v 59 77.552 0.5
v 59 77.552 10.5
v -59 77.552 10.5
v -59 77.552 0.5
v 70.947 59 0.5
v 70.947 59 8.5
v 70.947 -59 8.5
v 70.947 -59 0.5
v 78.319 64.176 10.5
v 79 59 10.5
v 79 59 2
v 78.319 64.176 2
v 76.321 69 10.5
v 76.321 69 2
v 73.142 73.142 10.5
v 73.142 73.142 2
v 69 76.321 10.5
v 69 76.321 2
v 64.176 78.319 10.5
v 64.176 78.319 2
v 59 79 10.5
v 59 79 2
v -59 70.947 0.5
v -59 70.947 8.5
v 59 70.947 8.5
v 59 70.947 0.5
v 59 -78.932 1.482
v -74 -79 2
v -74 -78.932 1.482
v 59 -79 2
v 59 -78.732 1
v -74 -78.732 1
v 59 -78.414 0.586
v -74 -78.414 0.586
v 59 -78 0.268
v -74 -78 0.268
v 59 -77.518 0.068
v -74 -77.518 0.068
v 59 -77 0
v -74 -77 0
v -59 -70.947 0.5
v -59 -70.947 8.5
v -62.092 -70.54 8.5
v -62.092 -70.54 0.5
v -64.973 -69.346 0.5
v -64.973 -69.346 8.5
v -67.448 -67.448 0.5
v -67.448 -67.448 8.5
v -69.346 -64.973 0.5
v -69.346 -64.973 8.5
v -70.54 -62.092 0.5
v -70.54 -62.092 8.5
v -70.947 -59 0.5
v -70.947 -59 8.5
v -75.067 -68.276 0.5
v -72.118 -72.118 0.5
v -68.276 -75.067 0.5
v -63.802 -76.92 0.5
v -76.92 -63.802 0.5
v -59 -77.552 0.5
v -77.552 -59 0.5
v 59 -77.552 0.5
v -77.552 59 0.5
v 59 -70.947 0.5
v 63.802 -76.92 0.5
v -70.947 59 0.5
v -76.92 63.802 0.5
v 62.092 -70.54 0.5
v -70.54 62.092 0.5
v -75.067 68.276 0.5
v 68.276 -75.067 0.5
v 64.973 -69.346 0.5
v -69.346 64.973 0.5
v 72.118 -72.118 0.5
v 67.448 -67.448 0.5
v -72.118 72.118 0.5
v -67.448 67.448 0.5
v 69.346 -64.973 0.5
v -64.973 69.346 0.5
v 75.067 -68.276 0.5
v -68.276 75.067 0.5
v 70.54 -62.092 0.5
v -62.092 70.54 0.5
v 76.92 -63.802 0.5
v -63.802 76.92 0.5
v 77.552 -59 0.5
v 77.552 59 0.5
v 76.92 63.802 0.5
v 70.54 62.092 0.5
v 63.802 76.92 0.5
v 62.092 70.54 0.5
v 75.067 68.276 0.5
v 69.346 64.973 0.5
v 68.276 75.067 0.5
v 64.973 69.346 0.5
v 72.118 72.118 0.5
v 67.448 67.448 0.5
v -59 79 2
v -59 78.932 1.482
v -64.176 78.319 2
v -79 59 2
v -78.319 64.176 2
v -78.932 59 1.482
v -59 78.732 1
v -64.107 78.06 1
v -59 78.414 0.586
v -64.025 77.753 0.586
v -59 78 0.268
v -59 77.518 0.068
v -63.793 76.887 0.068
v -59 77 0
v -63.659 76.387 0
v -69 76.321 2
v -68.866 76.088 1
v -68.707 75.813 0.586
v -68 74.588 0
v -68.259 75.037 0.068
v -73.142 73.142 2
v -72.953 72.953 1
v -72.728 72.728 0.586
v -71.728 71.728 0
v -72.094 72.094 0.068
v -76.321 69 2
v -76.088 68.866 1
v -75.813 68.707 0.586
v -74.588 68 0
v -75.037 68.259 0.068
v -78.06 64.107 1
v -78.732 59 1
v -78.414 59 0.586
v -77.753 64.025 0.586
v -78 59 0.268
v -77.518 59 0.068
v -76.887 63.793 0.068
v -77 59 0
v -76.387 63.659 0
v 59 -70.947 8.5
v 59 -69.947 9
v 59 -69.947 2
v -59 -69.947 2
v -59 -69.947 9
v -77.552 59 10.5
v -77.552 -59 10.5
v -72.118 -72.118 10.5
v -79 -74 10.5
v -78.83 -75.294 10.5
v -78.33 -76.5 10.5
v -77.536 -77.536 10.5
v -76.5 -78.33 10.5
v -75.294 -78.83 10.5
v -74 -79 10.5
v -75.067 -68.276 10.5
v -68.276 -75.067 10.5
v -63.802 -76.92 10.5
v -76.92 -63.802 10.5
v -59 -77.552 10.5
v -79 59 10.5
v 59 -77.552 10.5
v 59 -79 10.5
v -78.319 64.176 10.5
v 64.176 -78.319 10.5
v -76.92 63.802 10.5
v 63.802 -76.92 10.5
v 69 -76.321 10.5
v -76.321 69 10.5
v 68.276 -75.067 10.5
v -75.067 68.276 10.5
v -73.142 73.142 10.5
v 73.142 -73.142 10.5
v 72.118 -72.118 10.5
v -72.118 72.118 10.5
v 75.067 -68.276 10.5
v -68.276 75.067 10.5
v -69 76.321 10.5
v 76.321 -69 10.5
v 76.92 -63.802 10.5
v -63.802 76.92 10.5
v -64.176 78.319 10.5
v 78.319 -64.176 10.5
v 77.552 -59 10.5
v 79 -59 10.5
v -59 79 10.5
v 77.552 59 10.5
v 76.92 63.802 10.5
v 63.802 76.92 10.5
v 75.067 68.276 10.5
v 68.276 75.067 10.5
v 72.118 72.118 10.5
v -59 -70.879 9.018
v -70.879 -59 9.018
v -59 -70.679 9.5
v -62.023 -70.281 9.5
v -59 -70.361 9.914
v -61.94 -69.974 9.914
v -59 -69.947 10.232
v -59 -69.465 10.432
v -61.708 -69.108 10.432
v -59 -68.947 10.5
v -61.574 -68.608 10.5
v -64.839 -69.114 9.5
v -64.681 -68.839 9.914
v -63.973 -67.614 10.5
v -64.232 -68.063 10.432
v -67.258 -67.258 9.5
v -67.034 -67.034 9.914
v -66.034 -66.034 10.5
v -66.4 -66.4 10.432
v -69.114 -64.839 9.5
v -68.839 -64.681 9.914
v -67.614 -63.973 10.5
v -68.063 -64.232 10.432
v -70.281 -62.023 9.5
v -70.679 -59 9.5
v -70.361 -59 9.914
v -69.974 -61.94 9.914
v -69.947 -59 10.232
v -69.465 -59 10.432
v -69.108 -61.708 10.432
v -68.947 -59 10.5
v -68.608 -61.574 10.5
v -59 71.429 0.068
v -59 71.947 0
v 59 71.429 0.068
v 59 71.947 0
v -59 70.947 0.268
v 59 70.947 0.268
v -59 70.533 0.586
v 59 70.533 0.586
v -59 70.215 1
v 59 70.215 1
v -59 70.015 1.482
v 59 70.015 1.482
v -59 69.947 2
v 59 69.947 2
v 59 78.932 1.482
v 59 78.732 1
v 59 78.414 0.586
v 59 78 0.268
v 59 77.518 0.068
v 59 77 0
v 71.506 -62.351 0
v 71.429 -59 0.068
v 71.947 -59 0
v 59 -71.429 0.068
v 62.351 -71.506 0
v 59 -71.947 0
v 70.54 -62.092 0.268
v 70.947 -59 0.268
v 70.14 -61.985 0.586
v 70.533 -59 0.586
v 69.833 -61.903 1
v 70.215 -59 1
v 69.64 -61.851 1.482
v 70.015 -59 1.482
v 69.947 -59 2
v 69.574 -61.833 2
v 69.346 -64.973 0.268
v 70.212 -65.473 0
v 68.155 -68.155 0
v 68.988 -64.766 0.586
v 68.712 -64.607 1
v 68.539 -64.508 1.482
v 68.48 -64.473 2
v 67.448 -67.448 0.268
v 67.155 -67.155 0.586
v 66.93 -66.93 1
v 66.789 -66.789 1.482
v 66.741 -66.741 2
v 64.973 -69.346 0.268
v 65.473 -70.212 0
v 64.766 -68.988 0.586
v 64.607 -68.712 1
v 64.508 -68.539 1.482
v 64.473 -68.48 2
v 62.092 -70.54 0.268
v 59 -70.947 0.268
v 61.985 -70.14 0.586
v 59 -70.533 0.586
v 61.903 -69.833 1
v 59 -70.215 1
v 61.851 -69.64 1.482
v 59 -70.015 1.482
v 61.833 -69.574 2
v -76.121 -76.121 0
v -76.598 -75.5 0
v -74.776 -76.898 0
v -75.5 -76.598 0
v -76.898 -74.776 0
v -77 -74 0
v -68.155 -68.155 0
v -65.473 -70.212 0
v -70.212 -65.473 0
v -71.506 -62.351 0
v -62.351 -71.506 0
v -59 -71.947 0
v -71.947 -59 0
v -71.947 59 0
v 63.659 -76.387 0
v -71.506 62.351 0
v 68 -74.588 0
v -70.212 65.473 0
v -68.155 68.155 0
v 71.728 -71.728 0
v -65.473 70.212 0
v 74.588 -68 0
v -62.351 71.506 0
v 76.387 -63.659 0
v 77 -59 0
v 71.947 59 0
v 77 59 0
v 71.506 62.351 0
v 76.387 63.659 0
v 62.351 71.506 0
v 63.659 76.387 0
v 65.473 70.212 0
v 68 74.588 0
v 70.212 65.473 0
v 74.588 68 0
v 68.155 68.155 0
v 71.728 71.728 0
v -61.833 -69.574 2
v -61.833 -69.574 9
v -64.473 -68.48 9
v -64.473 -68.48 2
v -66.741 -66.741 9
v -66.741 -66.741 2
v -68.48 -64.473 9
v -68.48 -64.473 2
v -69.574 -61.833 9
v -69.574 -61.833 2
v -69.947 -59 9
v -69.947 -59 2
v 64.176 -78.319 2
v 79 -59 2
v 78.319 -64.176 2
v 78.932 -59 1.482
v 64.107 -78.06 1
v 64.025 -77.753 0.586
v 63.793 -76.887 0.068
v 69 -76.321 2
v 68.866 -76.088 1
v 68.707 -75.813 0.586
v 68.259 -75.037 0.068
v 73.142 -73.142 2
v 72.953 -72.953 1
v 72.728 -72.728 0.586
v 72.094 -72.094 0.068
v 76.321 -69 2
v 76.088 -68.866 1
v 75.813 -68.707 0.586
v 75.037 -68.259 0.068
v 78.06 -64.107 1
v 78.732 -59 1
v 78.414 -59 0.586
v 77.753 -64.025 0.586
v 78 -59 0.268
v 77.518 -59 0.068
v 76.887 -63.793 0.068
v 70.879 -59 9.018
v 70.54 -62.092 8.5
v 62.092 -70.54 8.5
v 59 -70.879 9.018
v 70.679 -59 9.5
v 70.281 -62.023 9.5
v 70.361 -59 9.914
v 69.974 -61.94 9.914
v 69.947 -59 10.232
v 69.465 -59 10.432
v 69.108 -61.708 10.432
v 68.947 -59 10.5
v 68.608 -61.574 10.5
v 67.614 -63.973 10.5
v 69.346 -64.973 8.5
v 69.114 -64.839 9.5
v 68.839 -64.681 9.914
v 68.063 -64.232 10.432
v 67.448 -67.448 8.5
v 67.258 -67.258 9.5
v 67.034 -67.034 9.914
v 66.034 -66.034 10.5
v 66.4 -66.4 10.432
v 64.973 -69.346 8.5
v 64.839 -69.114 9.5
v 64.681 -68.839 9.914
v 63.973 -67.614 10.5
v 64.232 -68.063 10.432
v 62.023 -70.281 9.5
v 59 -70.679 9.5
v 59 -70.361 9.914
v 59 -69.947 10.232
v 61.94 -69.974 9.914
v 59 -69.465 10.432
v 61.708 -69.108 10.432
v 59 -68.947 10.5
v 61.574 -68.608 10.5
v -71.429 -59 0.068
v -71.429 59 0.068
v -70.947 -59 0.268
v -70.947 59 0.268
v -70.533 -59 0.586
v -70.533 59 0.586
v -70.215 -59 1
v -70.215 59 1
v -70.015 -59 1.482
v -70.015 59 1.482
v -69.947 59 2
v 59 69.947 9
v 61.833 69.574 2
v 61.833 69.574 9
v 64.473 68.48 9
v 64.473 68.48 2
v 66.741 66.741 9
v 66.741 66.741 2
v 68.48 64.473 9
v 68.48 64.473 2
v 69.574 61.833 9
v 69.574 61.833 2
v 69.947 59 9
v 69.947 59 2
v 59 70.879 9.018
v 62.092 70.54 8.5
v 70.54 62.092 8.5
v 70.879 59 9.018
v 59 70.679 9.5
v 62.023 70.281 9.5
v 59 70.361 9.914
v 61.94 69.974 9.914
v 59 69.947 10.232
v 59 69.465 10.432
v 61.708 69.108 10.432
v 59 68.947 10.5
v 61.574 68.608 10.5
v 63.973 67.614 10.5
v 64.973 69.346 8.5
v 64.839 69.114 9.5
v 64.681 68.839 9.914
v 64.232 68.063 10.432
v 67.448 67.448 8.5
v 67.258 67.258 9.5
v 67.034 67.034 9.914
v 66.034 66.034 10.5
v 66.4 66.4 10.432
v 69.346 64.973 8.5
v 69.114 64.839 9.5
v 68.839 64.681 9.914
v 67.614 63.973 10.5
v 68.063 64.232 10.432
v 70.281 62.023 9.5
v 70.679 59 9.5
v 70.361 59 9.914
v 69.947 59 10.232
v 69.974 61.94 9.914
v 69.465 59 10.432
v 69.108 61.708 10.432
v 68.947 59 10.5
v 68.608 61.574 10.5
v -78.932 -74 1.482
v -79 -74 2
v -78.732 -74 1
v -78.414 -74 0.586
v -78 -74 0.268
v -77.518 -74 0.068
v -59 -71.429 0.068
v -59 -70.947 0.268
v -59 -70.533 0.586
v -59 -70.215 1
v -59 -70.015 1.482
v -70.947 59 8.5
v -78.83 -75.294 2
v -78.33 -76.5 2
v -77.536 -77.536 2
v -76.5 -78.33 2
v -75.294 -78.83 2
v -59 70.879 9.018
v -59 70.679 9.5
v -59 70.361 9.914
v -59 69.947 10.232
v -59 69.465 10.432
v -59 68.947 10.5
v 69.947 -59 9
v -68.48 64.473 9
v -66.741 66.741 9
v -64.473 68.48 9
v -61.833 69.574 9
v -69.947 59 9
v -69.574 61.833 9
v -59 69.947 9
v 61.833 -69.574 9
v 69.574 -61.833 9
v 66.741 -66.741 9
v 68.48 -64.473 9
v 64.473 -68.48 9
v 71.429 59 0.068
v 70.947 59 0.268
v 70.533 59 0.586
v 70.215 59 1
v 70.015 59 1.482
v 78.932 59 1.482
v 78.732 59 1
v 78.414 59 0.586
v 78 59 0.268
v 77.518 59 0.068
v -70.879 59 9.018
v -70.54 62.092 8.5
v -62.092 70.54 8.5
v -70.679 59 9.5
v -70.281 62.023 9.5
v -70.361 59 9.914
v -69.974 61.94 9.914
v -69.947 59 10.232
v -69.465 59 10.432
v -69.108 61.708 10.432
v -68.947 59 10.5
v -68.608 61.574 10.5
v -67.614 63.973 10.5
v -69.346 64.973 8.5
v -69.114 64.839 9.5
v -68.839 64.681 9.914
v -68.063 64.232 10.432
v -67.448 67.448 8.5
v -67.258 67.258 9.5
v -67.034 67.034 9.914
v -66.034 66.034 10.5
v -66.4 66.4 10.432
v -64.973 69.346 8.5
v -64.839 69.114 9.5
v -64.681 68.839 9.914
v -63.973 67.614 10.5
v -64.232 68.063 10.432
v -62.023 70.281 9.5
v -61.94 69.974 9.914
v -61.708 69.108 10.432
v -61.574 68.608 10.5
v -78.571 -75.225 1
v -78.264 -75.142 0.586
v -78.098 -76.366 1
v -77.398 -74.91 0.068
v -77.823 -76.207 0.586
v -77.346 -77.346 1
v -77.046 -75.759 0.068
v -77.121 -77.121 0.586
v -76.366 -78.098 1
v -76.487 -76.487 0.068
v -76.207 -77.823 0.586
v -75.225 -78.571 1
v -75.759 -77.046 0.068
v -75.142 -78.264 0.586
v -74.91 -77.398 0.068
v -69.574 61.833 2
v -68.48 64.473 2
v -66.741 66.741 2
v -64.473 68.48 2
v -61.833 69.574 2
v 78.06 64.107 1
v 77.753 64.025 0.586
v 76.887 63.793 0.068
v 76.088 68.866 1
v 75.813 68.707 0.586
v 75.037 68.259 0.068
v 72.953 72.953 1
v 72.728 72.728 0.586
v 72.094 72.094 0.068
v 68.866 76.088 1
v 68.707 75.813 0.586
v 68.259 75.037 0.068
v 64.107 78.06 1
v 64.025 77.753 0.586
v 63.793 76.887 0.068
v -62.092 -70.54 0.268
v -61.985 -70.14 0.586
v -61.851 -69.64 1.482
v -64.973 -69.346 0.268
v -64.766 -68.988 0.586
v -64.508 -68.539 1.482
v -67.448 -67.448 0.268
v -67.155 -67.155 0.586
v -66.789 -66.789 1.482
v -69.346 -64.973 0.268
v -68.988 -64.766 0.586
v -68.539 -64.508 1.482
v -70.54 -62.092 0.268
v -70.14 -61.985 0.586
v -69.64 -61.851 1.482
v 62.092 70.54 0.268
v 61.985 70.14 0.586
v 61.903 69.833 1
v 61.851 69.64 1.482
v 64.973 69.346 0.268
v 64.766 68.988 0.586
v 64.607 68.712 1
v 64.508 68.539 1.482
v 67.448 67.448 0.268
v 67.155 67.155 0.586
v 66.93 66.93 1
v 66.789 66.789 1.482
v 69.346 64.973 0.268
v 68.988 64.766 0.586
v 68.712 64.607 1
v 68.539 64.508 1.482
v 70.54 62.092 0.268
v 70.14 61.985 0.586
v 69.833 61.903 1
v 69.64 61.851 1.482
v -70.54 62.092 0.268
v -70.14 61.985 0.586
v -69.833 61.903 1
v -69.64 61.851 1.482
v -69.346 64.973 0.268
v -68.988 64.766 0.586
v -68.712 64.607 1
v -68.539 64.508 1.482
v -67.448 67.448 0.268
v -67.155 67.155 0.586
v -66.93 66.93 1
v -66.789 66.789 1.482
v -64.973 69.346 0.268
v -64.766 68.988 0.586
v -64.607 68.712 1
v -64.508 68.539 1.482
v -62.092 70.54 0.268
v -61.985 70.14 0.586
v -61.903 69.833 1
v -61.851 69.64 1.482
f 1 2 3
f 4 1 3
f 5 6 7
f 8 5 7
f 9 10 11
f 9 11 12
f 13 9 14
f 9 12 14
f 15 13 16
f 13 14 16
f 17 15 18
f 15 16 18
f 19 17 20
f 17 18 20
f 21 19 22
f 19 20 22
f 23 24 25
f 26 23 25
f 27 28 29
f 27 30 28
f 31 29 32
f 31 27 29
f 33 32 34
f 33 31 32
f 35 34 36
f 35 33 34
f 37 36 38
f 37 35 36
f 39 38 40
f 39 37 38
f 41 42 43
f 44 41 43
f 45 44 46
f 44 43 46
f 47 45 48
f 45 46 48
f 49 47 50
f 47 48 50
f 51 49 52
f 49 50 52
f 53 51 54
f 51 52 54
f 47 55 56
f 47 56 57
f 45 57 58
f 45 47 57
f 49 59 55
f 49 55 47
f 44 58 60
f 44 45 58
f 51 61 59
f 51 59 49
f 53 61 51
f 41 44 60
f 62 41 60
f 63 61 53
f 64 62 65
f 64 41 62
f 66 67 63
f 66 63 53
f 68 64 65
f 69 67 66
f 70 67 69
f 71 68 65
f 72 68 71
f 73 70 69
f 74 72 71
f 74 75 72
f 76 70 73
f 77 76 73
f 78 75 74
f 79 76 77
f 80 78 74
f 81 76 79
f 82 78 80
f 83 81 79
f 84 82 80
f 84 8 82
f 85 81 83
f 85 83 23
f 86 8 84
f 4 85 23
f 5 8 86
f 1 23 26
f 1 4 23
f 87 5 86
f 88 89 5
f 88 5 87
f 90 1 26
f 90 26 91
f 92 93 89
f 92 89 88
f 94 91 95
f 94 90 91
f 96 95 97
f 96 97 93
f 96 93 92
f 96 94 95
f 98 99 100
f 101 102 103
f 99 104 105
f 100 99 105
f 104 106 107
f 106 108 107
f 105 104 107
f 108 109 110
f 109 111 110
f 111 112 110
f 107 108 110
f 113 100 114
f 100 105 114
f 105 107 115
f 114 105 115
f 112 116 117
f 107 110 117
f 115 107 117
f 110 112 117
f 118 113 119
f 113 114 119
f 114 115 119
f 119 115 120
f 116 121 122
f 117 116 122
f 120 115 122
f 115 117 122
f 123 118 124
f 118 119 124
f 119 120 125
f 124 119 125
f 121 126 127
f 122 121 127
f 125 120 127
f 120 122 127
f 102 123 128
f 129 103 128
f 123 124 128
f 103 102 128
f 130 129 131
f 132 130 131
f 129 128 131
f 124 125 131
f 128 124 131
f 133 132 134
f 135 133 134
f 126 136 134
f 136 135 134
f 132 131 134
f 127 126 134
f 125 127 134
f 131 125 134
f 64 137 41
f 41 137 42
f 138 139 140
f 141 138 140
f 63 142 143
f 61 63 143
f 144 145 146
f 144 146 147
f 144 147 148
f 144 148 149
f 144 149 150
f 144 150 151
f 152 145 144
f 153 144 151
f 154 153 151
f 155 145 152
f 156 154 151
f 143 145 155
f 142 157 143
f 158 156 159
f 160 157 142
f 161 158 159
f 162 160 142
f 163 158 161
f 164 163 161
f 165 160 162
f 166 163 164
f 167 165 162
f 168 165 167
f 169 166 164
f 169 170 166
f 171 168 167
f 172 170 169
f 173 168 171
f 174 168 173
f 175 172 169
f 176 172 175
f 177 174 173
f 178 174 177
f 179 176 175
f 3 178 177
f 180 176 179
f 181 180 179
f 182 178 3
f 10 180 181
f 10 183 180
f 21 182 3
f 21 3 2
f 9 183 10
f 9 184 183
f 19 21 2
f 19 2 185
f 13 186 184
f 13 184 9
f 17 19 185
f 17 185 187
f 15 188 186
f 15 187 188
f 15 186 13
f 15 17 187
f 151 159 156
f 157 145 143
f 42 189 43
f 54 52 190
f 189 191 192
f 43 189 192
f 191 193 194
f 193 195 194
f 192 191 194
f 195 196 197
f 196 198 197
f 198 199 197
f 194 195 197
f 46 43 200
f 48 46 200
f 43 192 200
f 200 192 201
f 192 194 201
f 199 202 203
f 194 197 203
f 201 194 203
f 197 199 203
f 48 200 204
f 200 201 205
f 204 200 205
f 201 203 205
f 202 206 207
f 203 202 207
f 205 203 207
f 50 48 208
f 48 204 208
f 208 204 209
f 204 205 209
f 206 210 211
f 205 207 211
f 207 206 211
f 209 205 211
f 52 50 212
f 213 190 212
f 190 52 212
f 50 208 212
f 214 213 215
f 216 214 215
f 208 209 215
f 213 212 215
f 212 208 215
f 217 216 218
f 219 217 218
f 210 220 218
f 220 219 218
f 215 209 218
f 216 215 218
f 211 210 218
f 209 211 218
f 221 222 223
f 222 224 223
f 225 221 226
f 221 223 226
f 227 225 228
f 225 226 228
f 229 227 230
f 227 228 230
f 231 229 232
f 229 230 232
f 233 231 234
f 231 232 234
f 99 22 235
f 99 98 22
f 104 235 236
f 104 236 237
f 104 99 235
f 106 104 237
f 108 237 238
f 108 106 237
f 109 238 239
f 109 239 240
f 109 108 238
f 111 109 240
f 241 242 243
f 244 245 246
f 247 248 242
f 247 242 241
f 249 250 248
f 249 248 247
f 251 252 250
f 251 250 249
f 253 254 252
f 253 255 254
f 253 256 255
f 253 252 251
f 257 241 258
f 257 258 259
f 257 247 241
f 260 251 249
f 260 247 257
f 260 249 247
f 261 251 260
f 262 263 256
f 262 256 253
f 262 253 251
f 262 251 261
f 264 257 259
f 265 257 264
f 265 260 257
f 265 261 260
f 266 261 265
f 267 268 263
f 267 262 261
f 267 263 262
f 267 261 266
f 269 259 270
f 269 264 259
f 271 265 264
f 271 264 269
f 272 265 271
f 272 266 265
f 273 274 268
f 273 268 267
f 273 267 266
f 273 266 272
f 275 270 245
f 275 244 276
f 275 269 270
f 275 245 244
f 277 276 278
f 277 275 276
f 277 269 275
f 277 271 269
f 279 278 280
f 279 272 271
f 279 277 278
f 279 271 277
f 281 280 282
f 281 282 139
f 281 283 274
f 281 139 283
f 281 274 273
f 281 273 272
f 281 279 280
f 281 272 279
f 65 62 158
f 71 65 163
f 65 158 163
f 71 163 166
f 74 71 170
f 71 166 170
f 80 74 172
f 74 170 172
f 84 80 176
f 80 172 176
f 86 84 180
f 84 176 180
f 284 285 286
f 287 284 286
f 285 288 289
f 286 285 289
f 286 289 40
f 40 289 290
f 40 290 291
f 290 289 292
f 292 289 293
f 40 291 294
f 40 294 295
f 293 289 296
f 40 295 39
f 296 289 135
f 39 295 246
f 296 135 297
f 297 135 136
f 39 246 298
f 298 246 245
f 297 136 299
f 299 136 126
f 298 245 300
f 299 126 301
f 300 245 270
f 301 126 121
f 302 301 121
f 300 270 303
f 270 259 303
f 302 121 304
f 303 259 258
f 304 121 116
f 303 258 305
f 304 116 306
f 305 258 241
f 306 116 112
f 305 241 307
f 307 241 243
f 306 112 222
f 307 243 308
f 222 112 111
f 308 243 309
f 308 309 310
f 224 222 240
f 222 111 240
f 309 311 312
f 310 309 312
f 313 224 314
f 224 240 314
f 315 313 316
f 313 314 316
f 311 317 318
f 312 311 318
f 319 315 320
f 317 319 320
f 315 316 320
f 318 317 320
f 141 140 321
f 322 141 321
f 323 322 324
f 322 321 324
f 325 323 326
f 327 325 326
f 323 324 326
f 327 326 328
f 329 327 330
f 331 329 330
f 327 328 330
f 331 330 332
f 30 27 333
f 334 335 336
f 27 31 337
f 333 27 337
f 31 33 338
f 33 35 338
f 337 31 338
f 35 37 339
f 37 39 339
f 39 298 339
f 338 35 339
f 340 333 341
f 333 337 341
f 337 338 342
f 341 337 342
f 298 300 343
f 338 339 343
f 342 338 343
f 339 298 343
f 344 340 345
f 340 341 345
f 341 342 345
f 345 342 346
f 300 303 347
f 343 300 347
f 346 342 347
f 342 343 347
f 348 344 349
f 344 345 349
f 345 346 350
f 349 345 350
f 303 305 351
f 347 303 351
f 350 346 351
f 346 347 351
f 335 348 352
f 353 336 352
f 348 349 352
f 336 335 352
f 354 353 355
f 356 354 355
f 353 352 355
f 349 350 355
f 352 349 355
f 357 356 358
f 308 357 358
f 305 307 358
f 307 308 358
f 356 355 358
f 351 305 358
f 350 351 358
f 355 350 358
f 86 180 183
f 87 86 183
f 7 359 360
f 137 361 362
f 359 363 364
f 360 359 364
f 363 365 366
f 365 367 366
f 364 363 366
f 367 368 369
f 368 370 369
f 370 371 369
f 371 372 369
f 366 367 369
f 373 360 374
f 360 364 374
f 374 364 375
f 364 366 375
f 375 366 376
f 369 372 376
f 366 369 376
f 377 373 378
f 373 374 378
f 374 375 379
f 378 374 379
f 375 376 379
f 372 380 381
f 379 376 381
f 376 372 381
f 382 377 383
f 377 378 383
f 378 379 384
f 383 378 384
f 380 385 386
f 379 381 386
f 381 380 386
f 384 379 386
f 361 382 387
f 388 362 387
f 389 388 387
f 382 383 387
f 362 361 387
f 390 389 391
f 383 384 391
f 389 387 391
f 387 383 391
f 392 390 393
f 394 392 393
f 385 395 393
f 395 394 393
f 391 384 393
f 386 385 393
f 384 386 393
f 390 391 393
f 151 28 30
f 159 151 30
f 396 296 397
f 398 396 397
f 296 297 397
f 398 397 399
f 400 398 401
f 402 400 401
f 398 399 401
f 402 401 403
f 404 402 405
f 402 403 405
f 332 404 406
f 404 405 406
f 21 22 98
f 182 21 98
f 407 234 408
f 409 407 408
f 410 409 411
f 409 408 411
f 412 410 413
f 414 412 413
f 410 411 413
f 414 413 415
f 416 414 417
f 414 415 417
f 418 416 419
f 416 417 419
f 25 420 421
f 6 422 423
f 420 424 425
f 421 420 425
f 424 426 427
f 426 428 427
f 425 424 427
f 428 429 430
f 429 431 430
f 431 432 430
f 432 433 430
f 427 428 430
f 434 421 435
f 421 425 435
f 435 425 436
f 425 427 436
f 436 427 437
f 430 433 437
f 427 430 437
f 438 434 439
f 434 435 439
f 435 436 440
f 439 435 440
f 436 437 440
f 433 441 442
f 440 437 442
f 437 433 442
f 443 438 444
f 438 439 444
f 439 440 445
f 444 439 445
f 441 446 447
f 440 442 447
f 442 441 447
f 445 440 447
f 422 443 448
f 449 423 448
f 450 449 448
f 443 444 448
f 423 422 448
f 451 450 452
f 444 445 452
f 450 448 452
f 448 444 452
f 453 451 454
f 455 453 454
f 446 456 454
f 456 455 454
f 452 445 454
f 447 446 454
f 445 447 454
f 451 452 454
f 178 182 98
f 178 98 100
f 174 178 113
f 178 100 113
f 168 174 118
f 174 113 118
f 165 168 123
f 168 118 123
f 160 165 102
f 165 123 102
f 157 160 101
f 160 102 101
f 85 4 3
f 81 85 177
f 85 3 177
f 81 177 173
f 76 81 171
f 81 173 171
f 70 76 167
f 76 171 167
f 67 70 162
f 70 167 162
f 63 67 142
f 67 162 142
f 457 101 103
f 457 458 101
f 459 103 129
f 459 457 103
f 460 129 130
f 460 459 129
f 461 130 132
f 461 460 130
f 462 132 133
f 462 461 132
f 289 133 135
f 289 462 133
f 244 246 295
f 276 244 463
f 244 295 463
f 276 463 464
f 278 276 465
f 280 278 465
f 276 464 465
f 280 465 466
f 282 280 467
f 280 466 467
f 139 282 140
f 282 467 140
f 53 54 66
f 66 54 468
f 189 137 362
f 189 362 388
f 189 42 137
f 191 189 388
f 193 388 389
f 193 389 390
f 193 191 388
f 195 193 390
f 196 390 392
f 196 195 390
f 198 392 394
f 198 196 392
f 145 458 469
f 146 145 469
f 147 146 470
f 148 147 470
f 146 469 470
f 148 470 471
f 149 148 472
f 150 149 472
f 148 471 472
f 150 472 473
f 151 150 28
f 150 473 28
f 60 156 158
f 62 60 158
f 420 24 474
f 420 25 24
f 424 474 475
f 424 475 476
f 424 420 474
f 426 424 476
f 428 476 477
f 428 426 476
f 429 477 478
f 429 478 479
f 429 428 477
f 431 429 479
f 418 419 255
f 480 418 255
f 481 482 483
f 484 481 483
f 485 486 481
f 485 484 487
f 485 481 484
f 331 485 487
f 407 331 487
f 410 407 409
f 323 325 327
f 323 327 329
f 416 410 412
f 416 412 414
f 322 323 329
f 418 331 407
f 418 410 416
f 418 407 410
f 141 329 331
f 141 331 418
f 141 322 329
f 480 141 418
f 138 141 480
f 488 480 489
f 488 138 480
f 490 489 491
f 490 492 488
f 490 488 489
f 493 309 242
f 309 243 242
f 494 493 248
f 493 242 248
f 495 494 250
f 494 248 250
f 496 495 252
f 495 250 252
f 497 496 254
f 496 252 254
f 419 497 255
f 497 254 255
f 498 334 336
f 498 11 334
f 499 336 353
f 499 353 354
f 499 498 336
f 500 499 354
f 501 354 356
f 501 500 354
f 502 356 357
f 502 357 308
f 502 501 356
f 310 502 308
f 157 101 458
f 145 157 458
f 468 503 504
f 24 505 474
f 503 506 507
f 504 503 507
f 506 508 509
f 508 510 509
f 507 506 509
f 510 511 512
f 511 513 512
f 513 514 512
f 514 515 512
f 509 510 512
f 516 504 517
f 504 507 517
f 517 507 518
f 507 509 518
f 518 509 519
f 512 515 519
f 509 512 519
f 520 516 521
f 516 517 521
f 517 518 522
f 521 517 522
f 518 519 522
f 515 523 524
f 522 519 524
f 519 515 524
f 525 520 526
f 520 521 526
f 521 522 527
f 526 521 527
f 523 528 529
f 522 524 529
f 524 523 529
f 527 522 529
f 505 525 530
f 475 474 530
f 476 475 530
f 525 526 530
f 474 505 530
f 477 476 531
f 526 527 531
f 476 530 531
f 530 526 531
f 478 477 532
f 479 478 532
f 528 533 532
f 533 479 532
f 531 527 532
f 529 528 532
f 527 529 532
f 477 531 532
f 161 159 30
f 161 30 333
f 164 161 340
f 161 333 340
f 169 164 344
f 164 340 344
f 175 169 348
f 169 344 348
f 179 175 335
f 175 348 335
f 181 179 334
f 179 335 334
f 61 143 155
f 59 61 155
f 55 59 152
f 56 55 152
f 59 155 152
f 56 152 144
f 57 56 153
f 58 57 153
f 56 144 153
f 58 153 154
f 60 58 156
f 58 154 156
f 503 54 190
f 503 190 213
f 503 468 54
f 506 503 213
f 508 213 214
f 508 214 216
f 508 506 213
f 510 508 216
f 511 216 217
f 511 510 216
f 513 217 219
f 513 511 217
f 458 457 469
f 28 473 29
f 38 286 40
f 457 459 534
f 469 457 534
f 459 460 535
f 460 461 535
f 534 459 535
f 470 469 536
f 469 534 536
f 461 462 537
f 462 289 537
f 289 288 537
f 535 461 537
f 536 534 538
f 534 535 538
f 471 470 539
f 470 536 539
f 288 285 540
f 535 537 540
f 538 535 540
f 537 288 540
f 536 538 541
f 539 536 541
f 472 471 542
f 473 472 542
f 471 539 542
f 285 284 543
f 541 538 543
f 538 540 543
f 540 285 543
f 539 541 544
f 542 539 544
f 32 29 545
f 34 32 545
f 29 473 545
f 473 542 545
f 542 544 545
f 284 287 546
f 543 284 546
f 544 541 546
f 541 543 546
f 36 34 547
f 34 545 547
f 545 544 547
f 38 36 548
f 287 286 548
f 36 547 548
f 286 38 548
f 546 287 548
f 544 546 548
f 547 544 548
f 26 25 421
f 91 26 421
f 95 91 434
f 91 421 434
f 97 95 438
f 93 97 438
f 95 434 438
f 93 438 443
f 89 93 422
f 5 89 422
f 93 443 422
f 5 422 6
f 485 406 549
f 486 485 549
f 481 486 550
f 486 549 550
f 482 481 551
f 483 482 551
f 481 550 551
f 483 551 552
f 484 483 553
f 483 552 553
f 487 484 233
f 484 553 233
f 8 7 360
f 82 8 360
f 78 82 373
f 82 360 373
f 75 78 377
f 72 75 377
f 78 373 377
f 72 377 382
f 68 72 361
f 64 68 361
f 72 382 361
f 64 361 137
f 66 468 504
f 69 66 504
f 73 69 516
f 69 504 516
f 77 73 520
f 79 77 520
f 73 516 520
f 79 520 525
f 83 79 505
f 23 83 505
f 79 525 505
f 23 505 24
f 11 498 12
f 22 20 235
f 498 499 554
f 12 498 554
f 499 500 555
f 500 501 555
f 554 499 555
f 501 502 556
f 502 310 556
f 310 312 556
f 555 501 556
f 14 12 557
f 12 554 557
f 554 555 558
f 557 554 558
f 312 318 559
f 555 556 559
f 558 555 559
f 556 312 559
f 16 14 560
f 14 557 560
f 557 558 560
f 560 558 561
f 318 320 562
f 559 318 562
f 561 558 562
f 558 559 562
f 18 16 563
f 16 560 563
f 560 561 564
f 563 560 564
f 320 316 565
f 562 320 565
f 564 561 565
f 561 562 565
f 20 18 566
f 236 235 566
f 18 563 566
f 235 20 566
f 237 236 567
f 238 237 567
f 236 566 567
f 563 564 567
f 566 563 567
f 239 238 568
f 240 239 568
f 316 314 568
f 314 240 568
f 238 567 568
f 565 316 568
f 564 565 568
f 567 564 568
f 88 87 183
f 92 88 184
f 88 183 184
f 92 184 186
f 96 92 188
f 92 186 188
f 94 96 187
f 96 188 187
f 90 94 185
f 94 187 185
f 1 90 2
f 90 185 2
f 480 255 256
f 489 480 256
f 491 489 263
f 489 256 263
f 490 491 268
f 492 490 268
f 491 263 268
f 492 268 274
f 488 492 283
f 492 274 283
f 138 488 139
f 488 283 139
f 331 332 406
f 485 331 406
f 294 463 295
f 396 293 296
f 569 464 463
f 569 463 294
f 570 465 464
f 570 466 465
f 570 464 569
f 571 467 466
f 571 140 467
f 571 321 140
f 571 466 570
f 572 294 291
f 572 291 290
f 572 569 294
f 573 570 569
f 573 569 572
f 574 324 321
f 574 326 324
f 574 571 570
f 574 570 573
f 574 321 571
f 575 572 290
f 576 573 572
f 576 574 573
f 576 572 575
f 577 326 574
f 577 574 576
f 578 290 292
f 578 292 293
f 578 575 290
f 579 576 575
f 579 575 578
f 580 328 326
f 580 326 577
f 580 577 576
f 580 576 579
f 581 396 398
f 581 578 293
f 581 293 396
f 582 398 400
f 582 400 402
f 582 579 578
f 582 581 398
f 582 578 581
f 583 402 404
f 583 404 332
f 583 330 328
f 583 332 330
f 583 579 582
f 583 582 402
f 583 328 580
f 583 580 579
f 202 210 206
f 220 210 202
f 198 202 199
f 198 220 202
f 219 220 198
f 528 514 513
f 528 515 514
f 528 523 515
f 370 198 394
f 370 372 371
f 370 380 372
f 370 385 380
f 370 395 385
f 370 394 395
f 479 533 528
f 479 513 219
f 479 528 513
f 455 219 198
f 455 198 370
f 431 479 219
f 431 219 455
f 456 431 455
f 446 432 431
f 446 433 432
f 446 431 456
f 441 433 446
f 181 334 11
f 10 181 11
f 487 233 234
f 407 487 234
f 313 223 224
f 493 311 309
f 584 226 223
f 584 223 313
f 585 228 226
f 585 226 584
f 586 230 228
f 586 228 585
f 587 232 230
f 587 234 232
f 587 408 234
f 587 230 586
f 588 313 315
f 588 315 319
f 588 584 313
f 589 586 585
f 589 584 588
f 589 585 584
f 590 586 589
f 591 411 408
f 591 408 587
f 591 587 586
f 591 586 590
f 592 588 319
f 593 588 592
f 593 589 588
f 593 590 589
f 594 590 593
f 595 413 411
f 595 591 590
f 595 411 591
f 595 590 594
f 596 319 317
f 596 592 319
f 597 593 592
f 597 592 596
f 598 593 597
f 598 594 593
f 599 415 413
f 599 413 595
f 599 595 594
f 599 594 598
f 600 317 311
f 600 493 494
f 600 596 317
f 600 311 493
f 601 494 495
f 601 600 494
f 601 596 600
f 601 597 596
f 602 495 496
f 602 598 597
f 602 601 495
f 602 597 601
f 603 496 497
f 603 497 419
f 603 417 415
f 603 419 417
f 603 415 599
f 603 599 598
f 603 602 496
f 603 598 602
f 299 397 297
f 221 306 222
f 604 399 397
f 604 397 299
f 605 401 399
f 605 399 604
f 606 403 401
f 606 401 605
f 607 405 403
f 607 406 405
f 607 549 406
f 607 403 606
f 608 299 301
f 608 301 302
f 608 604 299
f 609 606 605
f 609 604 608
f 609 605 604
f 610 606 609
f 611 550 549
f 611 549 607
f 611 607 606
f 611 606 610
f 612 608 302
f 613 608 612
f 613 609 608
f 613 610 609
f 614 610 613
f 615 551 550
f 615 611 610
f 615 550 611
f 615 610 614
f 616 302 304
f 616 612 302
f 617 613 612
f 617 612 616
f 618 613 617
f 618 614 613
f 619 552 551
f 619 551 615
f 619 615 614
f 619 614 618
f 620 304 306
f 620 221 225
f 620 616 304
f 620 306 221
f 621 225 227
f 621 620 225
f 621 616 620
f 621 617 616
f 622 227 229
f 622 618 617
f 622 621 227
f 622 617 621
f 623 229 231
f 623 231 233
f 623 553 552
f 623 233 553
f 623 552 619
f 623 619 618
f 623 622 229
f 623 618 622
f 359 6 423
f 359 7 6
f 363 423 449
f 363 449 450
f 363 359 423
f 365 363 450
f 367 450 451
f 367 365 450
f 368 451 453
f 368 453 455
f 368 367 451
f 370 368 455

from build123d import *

# Parameters (mm, degrees)
F1_DEPTH = 10.5
F3_DEPTH = 10
F5_DEPTH = 9
F6_R     = 2


with BuildPart() as f1:
    # F0 (on Top) → F1 (new body)
    with BuildSketch(Plane.XY):
        with BuildLine():
            Line((-74, -79), (59, -79))
            ThreePointArc((59, -79), (73.1421356237, -73.1421356237), (79, -59))
            Line((79, -59), (79, 59))
            ThreePointArc((79, 59), (73.1421356237, 73.1421356237), (59, 79))
            Line((59, 79), (-59, 79))
            ThreePointArc((-59, 79), (-73.1421356237, 73.1421356237), (-79, 59))
            Line((-79, 59), (-79, -74))
            ThreePointArc((-79, -74), (-77.5355339059, -77.5355339059), (-74, -79))
        make_face()
    extrude(amount=F1_DEPTH)

    # F2 (on face) → F3 (cut)
    with BuildSketch(Plane.XY.offset(10.5)):
        with BuildLine():
            Line((77.5522068143, -59), (77.5522068143, 59))
            ThreePointArc((77.5522068143, 59), (72.1183912444, 72.1183912444), (59, 77.5522068143))
            Line((59, 77.5522068143), (-59, 77.5522068143))
            ThreePointArc((-59, 77.5522068143), (-72.1183912444, 72.1183912444), (-77.5522068143, 59))
            Line((-77.5522068143, 59), (-77.5522068143, -59.0002068143))
            ThreePointArc((-77.5522068143, -59.0002068143), (-72.1184518189, -72.1184518189), (-59.0002068143, -77.5522068143))
            Line((-59.0002068143, -77.5522068143), (59, -77.5522068143))
            ThreePointArc((59, -77.5522068143), (72.1183912444, -72.1183912444), (77.5522068143, -59))
        make_face()
        with BuildLine():
            ThreePointArc((59, 70.9469467402), (67.4477670544, 67.4477670544), (70.9469467402, 59))
            Line((70.9469467402, 59), (70.9469467402, -59))
            ThreePointArc((70.9469467402, -59), (67.4477670544, -67.4477670544), (59, -70.9469467402))
            Line((59, -70.9469467402), (-58.9999467402, -70.9469467402))
            ThreePointArc((-58.9999467402, -70.9469467402), (-67.447751455, -67.447751455), (-70.9469467402, -58.9999467402))
            Line((-70.9469467402, -58.9999467402), (-70.9469467402, 59))
            ThreePointArc((-70.9469467402, 59), (-67.4477670544, 67.4477670544), (-59, 70.9469467402))
            Line((-59, 70.9469467402), (59, 70.9469467402))
        make_face(mode=Mode.SUBTRACT)
    extrude(amount=-F3_DEPTH, mode=Mode.SUBTRACT)

    # F4 (on face) → F5 (cut)
    with BuildSketch(Plane(origin=(0, 0, 0), x_dir=(1, 0, 0), z_dir=(0, 0, -1))):
        with BuildLine():
            ThreePointArc((59, -69.9469467402), (66.7406602732, -66.7406602732), (69.9469467402, -59))
            Line((69.9469467402, -59), (69.9469467402, 59))
            ThreePointArc((69.9469467402, 59), (66.7406602732, 66.7406602732), (59, 69.9469467402))
            Line((59, 69.9469467402), (-58.9999467402, 69.9469467402))
            ThreePointArc((-58.9999467402, 69.9469467402), (-66.7406446738, 66.7406446738), (-69.9469467402, 58.9999467402))
            Line((-69.9469467402, 58.9999467402), (-69.9469467402, -59))
            ThreePointArc((-69.9469467402, -59), (-66.7406602732, -66.7406602732), (-59, -69.9469467402))
            Line((-59, -69.9469467402), (59, -69.9469467402))
        make_face()
    extrude(amount=-F5_DEPTH, mode=Mode.SUBTRACT)

    # F6
    f6_edges = [f1.edges().sort_by_distance(p)[0] for p in [
        (-7.5, -79, 0),
        (-77.535534, -77.535534, 0),
        (73.142136, -73.142136, 0),
        (-79, -7.5, 0),
        (79, 0, 0),
        (-73.142136, 73.142136, 0),
        (73.142136, 73.142136, 0),
        (0, 79, 0),
        (-69.946947, 2.7e-05, 0),
        (-66.740645, -66.740645, 0),
        (2.7e-05, -69.946947, 0),
        (66.74066, -66.74066, 0),
        (69.946947, 0, 0),
        (66.74066, 66.74066, 0),
        (0, 69.946947, 0),
        (-66.74066, 66.74066, 0),
        (-67.447767, 67.447767, 10.5),
        (0, 70.946947, 10.5),
        (67.447767, 67.447767, 10.5),
        (70.946947, 0, 10.5),
        (67.447767, -67.447767, 10.5),
        (2.7e-05, -70.946947, 10.5),
        (-67.447751, -67.447751, 10.5),
        (-70.946947, 2.7e-05, 10.5),
    ]]
    fillet(f6_edges, radius=F6_R)


solid = f1.part
